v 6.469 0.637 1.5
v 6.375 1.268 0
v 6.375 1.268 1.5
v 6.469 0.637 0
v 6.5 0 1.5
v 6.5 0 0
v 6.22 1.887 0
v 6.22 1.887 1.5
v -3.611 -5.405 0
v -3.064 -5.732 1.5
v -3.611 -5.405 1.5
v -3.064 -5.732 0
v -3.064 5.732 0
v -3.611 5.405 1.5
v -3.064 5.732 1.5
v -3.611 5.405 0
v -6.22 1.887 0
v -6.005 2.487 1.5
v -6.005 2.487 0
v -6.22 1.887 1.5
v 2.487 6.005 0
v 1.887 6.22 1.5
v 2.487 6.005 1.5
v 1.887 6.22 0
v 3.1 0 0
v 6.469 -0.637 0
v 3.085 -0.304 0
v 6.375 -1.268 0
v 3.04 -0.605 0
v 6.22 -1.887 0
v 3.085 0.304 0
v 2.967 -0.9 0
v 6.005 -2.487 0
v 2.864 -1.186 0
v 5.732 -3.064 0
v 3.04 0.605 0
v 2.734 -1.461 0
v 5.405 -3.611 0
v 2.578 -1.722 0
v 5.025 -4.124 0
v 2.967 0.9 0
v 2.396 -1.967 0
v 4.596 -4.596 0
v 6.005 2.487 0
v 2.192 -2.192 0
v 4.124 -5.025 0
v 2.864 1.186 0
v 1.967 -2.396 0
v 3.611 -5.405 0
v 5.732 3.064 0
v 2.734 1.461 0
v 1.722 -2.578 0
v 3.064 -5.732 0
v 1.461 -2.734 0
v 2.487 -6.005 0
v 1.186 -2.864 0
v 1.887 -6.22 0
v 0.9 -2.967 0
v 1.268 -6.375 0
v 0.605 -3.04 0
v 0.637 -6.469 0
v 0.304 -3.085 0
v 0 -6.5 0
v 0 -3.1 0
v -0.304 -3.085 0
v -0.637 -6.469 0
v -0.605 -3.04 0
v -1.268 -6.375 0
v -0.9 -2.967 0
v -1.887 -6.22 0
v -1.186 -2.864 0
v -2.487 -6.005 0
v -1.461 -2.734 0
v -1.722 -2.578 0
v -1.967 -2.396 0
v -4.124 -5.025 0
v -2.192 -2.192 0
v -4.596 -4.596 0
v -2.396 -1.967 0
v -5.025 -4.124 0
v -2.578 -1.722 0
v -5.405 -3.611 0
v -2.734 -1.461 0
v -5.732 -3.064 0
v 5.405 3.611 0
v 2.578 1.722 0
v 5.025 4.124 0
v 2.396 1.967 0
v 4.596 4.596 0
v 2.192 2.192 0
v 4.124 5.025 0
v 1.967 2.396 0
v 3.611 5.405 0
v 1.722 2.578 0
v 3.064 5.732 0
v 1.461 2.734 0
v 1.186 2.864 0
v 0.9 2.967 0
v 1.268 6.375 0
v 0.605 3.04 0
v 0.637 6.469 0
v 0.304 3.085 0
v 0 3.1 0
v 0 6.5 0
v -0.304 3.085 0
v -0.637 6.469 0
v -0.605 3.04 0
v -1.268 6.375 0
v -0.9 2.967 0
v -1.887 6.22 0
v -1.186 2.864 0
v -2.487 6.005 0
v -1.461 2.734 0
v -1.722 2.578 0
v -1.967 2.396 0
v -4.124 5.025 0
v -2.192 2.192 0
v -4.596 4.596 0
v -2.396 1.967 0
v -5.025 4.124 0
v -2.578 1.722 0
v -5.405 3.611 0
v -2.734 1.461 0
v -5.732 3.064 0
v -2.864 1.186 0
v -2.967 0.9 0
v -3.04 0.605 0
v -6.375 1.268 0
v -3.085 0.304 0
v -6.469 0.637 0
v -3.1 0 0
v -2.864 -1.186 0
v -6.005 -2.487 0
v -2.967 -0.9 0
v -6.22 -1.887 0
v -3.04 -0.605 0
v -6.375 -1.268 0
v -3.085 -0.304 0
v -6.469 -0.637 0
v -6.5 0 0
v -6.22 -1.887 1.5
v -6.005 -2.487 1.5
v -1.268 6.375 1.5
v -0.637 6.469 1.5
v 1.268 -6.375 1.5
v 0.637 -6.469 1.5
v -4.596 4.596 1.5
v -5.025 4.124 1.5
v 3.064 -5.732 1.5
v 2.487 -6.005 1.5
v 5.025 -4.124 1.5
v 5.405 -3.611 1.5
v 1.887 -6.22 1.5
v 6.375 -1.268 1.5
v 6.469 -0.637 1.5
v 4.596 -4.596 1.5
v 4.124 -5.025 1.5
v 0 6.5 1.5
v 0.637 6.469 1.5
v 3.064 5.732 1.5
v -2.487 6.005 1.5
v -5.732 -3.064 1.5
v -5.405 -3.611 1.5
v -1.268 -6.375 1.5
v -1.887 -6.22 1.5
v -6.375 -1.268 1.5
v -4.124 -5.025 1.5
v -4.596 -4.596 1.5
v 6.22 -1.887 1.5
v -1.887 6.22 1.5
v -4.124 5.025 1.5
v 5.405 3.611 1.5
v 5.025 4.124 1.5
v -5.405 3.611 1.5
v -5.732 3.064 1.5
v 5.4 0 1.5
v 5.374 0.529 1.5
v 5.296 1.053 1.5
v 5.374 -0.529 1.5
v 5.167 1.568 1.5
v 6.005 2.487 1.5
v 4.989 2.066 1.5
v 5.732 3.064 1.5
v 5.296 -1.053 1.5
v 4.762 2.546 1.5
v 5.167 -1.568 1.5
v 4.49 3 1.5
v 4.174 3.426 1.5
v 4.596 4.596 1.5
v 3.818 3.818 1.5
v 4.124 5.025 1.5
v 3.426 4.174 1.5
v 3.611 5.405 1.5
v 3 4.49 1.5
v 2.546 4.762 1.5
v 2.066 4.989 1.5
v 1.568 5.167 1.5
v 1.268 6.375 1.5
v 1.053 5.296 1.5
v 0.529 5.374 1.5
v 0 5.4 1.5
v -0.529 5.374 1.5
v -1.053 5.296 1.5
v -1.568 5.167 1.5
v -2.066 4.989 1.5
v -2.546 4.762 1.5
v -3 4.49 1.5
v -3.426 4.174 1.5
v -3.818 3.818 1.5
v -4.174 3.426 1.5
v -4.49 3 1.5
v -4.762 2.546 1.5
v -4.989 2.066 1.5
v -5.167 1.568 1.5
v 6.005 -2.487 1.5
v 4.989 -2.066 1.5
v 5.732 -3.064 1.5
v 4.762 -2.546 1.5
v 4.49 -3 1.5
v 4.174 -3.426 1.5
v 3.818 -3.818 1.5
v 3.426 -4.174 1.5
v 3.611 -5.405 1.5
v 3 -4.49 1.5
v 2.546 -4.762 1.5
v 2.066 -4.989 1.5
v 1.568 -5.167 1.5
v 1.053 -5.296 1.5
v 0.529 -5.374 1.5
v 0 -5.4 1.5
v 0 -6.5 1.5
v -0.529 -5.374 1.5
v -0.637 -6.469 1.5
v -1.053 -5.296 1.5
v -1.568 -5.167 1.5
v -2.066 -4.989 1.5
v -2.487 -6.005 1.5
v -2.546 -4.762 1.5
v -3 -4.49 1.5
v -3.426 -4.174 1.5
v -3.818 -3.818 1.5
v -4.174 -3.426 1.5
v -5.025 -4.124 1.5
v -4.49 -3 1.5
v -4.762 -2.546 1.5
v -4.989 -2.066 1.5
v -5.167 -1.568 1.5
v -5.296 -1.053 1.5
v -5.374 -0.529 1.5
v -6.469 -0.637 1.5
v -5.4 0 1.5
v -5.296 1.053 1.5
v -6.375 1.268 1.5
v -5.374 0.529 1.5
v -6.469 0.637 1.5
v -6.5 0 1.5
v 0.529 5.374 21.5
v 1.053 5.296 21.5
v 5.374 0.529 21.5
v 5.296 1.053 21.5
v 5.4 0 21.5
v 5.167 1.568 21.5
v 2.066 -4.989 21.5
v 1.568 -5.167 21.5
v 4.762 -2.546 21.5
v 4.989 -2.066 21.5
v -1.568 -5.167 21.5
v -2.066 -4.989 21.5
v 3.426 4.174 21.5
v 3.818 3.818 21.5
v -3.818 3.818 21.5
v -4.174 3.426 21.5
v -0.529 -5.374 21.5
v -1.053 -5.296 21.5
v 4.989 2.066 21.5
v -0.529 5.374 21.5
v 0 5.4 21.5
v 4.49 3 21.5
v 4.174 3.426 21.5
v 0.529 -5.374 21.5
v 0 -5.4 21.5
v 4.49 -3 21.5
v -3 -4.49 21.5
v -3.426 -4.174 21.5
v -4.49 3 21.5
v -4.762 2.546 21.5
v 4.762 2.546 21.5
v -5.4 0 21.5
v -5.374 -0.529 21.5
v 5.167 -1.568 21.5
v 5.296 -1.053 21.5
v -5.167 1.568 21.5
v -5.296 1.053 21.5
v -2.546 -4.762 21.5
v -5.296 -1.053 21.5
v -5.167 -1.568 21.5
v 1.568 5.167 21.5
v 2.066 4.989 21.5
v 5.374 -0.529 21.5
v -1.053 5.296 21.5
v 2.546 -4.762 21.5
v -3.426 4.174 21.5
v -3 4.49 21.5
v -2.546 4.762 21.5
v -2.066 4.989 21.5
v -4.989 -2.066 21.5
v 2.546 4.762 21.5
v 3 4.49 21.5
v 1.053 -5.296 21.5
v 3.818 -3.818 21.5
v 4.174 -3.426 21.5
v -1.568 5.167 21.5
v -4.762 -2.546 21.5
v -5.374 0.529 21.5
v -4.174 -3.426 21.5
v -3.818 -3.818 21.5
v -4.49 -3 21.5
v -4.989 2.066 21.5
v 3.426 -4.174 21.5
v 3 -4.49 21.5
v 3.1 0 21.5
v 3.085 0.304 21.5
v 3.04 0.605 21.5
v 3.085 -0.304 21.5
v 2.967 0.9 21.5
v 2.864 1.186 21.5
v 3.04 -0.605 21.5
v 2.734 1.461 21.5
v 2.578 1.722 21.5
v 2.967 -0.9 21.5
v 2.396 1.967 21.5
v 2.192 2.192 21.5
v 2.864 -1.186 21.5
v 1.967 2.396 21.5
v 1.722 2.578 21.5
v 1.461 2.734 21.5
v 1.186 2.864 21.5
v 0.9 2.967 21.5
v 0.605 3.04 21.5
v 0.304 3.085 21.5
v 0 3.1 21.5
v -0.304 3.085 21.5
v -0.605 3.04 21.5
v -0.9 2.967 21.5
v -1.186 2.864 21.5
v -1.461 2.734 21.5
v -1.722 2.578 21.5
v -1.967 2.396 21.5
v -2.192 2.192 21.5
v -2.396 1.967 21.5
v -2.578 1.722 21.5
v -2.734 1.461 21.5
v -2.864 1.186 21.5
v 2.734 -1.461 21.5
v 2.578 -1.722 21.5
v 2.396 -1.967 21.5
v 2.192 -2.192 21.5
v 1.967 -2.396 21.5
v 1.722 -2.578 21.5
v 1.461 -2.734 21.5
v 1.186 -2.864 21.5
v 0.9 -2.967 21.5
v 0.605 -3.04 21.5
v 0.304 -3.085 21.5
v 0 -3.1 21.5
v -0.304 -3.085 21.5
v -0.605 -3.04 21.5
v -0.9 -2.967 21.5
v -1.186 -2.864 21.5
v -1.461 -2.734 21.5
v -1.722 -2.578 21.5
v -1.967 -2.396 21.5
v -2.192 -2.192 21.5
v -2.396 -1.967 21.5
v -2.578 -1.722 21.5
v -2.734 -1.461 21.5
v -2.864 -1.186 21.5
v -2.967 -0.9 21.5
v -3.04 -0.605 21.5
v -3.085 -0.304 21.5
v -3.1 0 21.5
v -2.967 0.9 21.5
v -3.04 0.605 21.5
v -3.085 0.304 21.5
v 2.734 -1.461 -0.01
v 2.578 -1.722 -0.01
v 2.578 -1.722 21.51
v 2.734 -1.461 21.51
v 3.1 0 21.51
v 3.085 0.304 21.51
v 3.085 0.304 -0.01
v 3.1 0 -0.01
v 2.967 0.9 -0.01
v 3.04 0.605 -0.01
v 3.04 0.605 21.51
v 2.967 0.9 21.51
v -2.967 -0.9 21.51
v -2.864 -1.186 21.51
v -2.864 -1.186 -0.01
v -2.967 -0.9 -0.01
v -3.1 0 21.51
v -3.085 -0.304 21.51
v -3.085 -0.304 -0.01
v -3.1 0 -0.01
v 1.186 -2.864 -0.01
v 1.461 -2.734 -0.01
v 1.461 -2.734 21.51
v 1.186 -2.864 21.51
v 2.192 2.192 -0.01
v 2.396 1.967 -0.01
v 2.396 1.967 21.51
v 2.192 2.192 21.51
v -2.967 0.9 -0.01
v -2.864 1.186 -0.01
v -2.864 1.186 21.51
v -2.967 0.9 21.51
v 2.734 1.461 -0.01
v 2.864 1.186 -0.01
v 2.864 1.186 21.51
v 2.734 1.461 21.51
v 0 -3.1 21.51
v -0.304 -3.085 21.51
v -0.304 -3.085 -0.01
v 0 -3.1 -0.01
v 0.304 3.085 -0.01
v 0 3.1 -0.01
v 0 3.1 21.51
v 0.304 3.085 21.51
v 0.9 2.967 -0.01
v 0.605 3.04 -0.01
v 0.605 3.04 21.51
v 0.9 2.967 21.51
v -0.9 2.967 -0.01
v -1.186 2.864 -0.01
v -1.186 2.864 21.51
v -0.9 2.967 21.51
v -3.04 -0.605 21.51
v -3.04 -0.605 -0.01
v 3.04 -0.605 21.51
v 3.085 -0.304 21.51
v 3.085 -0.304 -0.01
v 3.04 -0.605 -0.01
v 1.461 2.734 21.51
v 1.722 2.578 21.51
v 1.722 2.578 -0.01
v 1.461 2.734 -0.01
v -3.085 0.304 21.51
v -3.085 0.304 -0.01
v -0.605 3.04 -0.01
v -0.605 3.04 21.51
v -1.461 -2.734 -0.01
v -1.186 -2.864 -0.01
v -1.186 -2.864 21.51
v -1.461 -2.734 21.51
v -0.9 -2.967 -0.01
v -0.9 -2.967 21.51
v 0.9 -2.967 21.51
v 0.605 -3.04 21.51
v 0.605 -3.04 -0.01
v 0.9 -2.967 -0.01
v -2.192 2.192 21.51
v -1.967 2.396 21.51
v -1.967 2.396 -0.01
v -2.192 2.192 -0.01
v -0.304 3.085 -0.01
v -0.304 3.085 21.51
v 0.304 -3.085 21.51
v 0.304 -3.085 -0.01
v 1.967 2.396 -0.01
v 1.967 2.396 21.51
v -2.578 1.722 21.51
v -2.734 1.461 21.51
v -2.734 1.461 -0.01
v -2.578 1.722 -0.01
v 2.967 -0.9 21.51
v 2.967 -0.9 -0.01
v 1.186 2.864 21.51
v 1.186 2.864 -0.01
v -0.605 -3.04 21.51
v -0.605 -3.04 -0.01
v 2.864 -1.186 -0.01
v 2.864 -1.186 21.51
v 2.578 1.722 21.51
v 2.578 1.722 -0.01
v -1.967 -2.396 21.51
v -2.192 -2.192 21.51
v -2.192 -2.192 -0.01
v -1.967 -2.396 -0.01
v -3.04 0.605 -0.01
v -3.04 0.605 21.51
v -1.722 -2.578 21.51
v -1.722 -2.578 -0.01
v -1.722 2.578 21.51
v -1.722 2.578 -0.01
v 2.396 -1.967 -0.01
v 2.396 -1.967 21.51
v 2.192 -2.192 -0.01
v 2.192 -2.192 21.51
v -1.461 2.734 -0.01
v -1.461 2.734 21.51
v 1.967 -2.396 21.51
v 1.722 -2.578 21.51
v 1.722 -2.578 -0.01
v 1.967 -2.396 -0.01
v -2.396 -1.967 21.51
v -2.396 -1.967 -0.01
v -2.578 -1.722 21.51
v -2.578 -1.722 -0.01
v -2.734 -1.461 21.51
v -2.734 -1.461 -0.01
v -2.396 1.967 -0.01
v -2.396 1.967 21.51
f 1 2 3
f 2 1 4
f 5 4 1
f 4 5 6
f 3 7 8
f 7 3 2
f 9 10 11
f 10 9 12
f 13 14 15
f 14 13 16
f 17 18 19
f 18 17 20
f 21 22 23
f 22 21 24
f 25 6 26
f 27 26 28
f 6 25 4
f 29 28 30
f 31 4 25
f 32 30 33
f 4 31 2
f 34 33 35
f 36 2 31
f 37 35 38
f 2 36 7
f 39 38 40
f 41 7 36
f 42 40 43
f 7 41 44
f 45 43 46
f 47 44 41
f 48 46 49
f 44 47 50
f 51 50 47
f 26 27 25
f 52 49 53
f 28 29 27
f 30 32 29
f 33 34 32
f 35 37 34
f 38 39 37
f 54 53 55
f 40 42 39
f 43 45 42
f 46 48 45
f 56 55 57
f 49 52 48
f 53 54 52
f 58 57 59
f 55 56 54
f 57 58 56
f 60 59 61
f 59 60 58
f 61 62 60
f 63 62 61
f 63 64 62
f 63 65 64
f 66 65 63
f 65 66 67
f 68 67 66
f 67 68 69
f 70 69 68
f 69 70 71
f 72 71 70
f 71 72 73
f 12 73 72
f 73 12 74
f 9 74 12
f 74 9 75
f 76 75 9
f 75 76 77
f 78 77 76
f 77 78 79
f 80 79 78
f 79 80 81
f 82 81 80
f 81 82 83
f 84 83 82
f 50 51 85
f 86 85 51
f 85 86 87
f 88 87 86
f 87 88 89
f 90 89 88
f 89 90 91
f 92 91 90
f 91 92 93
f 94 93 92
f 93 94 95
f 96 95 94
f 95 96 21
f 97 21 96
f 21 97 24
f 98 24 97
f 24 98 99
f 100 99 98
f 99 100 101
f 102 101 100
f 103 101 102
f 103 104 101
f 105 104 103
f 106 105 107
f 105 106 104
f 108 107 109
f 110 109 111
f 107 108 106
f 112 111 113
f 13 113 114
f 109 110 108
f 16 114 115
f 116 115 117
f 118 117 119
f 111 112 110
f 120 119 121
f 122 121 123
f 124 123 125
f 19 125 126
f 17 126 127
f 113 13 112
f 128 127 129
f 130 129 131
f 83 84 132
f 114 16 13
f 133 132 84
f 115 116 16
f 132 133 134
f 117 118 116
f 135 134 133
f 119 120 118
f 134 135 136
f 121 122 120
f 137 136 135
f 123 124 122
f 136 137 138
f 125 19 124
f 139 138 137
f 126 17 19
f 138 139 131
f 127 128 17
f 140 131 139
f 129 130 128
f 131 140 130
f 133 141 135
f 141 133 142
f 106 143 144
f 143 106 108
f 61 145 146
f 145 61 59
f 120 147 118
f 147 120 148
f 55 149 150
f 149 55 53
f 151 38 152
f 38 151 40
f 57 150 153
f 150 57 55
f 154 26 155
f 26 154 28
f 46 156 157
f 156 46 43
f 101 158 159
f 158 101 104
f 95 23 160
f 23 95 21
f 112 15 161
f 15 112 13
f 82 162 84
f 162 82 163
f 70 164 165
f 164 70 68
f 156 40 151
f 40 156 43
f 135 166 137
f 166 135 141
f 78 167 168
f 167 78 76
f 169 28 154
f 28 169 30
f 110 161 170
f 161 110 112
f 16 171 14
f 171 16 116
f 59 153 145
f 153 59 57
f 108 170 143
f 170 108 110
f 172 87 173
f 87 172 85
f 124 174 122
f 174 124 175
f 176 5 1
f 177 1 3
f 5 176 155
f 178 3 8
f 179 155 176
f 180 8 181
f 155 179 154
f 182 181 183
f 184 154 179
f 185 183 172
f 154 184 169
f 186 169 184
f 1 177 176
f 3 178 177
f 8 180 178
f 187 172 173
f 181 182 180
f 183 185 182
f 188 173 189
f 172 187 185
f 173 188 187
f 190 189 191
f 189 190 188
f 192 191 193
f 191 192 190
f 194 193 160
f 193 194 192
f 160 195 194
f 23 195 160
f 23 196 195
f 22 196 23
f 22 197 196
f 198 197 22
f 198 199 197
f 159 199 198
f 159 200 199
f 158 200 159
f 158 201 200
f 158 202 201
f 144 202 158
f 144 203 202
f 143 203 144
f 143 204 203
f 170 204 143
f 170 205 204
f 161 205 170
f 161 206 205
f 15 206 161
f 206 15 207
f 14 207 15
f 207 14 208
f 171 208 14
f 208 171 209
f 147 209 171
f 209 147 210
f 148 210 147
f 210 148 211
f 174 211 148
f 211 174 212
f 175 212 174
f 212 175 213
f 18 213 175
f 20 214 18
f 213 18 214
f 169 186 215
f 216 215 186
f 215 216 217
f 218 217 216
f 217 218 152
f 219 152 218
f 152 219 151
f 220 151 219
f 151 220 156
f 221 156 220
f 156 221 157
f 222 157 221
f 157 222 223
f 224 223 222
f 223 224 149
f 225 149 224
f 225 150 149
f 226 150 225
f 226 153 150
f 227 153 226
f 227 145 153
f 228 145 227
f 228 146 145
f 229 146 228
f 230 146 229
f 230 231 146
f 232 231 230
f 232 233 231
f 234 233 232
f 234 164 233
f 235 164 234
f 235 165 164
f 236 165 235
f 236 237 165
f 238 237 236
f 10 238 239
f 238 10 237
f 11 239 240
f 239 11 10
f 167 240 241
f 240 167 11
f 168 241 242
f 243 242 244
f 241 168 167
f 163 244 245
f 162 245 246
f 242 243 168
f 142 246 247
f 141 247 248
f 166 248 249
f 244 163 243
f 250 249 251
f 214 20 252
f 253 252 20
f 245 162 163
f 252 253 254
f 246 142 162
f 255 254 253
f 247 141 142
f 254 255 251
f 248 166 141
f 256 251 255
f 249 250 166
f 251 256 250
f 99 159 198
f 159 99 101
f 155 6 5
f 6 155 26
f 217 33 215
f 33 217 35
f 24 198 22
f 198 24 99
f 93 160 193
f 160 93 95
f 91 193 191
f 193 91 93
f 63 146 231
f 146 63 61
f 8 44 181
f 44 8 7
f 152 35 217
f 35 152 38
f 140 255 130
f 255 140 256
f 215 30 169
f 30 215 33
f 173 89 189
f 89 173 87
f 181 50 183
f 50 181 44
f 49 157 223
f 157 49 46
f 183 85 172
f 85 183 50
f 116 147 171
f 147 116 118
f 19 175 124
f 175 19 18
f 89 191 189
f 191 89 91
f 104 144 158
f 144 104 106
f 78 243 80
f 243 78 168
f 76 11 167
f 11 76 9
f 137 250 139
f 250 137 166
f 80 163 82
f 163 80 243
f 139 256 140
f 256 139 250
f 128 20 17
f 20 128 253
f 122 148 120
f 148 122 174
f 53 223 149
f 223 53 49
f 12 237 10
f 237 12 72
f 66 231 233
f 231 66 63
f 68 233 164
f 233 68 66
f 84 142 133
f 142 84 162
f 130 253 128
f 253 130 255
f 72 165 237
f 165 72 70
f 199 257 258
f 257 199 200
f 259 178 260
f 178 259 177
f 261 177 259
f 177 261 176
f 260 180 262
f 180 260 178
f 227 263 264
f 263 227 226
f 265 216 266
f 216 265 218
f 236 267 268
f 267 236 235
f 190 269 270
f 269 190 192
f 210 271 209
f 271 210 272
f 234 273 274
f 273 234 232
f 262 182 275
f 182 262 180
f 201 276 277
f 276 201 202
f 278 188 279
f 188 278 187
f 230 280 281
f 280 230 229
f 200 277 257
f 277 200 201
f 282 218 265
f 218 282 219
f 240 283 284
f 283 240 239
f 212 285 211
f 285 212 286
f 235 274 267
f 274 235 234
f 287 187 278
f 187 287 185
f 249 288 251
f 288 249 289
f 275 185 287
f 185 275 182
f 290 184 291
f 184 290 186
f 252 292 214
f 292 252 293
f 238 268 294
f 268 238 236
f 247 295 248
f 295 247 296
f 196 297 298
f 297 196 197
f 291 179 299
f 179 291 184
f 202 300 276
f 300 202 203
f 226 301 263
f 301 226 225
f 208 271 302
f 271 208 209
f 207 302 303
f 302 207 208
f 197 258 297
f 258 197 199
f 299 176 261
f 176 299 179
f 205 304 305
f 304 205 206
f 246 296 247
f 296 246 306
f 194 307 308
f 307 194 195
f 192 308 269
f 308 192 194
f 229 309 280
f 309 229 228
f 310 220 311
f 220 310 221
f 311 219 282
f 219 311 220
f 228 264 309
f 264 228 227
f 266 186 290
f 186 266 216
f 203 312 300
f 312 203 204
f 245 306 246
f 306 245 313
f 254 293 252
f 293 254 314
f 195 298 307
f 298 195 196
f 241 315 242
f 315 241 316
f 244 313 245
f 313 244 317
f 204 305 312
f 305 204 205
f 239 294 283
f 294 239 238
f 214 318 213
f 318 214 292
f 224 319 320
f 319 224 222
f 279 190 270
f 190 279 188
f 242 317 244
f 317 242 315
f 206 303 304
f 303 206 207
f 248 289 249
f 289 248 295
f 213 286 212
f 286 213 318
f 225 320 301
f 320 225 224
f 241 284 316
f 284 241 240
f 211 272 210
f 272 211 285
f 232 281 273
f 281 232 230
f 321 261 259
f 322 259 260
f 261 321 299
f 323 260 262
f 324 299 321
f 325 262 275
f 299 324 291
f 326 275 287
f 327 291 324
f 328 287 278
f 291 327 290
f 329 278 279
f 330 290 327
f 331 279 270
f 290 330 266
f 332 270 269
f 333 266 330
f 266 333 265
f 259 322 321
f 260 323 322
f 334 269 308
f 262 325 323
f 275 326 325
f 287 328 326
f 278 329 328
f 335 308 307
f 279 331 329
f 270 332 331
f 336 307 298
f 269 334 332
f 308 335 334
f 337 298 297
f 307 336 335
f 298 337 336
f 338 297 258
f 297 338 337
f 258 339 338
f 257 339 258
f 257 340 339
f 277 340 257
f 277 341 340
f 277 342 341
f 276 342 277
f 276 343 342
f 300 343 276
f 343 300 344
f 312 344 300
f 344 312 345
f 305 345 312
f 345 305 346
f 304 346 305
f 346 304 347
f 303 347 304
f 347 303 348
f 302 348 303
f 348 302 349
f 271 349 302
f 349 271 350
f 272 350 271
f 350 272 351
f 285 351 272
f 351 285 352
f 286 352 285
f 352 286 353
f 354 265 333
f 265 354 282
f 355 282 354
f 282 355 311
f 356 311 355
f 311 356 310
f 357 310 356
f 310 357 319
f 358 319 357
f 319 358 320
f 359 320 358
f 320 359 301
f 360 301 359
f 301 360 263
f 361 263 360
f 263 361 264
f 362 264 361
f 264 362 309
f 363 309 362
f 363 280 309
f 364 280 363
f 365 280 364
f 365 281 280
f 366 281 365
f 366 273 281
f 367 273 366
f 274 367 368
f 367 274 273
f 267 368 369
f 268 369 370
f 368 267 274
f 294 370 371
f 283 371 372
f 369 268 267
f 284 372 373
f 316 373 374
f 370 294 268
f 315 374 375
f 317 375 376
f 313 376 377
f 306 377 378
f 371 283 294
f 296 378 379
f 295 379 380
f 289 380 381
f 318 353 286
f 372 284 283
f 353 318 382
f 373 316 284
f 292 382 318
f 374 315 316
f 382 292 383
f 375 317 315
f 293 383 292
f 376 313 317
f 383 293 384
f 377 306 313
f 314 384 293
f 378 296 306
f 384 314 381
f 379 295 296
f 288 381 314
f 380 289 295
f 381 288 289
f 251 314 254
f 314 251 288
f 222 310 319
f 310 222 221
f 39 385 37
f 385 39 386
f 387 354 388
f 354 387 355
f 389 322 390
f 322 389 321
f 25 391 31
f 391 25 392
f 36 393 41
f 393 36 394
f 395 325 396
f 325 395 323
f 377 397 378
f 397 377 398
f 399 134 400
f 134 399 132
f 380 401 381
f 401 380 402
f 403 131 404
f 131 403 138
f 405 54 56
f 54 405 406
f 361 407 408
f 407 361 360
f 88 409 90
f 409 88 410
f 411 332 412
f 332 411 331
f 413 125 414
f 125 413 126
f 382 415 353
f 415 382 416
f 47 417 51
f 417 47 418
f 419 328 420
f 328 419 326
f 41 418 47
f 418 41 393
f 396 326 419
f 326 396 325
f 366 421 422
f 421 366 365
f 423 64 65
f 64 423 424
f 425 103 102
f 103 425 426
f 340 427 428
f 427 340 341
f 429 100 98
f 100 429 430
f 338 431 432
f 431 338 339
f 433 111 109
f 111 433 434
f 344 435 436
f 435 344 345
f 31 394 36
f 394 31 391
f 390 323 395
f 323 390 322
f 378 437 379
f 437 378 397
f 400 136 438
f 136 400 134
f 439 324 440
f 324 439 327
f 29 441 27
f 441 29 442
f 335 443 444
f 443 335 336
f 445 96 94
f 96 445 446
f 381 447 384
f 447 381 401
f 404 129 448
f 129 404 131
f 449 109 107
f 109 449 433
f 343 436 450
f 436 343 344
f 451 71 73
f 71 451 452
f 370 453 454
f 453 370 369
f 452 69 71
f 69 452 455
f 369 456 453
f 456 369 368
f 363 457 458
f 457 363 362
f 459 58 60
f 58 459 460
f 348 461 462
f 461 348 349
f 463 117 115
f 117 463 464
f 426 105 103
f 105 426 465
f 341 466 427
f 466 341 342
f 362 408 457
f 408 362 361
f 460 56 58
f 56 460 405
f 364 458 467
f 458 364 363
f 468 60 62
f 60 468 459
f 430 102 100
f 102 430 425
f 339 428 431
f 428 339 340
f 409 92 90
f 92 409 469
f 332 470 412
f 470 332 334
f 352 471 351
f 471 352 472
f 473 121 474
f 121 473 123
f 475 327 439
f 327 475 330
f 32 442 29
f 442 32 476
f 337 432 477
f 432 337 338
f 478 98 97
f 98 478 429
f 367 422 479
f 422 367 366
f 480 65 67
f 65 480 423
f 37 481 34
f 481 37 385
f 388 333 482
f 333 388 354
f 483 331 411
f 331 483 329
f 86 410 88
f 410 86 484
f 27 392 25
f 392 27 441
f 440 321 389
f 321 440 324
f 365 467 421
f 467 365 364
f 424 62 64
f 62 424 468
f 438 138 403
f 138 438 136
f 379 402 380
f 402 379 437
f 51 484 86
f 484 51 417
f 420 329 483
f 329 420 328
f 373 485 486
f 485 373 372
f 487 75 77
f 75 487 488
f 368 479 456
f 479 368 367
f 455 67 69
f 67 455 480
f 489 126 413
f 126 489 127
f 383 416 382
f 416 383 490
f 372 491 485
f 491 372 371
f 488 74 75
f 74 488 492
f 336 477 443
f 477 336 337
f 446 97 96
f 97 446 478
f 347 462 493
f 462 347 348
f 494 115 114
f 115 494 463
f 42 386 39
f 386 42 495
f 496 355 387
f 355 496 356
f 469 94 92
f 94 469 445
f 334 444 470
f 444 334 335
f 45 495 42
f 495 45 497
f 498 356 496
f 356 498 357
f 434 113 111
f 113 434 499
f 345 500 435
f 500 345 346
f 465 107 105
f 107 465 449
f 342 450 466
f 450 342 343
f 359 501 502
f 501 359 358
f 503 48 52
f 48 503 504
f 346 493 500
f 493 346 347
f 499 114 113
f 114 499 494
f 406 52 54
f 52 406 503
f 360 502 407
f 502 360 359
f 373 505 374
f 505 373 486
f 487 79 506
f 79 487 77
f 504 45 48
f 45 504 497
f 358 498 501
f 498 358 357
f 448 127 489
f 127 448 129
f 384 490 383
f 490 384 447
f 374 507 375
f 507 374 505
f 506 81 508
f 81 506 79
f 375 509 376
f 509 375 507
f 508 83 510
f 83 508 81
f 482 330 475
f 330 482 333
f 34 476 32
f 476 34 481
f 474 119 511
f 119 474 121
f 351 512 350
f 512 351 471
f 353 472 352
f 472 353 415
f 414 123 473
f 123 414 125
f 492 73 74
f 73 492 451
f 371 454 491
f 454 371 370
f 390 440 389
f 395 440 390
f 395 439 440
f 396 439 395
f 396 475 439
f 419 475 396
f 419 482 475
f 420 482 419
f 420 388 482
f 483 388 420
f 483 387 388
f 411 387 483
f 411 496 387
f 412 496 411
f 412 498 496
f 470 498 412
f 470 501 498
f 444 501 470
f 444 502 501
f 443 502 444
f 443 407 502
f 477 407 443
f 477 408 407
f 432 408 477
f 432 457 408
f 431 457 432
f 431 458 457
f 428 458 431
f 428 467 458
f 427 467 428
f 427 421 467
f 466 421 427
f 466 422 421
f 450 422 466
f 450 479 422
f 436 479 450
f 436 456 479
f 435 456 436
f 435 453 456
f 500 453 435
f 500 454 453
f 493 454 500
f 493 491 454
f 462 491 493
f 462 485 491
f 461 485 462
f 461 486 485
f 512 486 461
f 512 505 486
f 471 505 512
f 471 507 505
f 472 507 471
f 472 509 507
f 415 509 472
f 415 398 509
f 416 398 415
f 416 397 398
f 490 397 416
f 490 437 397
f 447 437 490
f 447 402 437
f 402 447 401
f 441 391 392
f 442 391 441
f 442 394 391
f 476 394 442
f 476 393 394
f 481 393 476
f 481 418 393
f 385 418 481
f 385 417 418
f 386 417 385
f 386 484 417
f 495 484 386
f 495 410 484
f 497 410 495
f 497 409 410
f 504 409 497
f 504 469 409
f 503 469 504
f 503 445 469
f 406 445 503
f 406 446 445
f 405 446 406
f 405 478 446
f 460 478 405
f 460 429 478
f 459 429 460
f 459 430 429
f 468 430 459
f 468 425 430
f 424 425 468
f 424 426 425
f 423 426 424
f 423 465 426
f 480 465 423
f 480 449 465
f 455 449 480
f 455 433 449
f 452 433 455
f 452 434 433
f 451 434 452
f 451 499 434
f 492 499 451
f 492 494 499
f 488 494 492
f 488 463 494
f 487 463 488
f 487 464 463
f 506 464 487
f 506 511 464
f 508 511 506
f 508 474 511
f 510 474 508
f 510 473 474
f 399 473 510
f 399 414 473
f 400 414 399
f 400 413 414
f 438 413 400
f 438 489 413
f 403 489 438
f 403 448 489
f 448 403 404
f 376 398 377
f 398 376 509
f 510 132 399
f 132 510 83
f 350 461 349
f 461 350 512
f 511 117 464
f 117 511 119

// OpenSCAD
// Adapter sleeve for 0.2 mL PCR tube in 1.5 mL rack hole
// Print orientation: upside down (collar on bed)

$fn = 64;

// Dimensions
collar_diameter = 13;       // mm
collar_thickness = 1.5;     // mm (z = 0 to 1.5)
sleeve_outer_diameter = 10.8; // mm
sleeve_height = 20.0;       // mm (rises from z=1.5 to z=21.5)
bore_diameter = 6.2;        // mm

// Calculate radii
collar_radius = collar_diameter / 2;
sleeve_outer_radius = sleeve_outer_diameter / 2;
bore_radius = bore_diameter / 2;
total_height = collar_thickness + sleeve_height;

// Build the adapter
module adapter_sleeve() {
    // Collar (bottom part) - from z=0 to z=1.5
    translate([0, 0, 0]) {
        cylinder(h = collar_thickness, r = collar_radius, center = false);
    }
    
    // Sleeve body (upper part) - from z=1.5 to z=21.5
    translate([0, 0, collar_thickness]) {
        cylinder(h = sleeve_height, r = sleeve_outer_radius, center = false);
    }
    
    // Bore (through-hole) - extends 0.01 mm past both ends
    translate([0, 0, -0.01]) {
        cylinder(h = total_height + 0.02, r = bore_radius, center = false);
    }
}

// Render the adapter
adapter_sleeve();
